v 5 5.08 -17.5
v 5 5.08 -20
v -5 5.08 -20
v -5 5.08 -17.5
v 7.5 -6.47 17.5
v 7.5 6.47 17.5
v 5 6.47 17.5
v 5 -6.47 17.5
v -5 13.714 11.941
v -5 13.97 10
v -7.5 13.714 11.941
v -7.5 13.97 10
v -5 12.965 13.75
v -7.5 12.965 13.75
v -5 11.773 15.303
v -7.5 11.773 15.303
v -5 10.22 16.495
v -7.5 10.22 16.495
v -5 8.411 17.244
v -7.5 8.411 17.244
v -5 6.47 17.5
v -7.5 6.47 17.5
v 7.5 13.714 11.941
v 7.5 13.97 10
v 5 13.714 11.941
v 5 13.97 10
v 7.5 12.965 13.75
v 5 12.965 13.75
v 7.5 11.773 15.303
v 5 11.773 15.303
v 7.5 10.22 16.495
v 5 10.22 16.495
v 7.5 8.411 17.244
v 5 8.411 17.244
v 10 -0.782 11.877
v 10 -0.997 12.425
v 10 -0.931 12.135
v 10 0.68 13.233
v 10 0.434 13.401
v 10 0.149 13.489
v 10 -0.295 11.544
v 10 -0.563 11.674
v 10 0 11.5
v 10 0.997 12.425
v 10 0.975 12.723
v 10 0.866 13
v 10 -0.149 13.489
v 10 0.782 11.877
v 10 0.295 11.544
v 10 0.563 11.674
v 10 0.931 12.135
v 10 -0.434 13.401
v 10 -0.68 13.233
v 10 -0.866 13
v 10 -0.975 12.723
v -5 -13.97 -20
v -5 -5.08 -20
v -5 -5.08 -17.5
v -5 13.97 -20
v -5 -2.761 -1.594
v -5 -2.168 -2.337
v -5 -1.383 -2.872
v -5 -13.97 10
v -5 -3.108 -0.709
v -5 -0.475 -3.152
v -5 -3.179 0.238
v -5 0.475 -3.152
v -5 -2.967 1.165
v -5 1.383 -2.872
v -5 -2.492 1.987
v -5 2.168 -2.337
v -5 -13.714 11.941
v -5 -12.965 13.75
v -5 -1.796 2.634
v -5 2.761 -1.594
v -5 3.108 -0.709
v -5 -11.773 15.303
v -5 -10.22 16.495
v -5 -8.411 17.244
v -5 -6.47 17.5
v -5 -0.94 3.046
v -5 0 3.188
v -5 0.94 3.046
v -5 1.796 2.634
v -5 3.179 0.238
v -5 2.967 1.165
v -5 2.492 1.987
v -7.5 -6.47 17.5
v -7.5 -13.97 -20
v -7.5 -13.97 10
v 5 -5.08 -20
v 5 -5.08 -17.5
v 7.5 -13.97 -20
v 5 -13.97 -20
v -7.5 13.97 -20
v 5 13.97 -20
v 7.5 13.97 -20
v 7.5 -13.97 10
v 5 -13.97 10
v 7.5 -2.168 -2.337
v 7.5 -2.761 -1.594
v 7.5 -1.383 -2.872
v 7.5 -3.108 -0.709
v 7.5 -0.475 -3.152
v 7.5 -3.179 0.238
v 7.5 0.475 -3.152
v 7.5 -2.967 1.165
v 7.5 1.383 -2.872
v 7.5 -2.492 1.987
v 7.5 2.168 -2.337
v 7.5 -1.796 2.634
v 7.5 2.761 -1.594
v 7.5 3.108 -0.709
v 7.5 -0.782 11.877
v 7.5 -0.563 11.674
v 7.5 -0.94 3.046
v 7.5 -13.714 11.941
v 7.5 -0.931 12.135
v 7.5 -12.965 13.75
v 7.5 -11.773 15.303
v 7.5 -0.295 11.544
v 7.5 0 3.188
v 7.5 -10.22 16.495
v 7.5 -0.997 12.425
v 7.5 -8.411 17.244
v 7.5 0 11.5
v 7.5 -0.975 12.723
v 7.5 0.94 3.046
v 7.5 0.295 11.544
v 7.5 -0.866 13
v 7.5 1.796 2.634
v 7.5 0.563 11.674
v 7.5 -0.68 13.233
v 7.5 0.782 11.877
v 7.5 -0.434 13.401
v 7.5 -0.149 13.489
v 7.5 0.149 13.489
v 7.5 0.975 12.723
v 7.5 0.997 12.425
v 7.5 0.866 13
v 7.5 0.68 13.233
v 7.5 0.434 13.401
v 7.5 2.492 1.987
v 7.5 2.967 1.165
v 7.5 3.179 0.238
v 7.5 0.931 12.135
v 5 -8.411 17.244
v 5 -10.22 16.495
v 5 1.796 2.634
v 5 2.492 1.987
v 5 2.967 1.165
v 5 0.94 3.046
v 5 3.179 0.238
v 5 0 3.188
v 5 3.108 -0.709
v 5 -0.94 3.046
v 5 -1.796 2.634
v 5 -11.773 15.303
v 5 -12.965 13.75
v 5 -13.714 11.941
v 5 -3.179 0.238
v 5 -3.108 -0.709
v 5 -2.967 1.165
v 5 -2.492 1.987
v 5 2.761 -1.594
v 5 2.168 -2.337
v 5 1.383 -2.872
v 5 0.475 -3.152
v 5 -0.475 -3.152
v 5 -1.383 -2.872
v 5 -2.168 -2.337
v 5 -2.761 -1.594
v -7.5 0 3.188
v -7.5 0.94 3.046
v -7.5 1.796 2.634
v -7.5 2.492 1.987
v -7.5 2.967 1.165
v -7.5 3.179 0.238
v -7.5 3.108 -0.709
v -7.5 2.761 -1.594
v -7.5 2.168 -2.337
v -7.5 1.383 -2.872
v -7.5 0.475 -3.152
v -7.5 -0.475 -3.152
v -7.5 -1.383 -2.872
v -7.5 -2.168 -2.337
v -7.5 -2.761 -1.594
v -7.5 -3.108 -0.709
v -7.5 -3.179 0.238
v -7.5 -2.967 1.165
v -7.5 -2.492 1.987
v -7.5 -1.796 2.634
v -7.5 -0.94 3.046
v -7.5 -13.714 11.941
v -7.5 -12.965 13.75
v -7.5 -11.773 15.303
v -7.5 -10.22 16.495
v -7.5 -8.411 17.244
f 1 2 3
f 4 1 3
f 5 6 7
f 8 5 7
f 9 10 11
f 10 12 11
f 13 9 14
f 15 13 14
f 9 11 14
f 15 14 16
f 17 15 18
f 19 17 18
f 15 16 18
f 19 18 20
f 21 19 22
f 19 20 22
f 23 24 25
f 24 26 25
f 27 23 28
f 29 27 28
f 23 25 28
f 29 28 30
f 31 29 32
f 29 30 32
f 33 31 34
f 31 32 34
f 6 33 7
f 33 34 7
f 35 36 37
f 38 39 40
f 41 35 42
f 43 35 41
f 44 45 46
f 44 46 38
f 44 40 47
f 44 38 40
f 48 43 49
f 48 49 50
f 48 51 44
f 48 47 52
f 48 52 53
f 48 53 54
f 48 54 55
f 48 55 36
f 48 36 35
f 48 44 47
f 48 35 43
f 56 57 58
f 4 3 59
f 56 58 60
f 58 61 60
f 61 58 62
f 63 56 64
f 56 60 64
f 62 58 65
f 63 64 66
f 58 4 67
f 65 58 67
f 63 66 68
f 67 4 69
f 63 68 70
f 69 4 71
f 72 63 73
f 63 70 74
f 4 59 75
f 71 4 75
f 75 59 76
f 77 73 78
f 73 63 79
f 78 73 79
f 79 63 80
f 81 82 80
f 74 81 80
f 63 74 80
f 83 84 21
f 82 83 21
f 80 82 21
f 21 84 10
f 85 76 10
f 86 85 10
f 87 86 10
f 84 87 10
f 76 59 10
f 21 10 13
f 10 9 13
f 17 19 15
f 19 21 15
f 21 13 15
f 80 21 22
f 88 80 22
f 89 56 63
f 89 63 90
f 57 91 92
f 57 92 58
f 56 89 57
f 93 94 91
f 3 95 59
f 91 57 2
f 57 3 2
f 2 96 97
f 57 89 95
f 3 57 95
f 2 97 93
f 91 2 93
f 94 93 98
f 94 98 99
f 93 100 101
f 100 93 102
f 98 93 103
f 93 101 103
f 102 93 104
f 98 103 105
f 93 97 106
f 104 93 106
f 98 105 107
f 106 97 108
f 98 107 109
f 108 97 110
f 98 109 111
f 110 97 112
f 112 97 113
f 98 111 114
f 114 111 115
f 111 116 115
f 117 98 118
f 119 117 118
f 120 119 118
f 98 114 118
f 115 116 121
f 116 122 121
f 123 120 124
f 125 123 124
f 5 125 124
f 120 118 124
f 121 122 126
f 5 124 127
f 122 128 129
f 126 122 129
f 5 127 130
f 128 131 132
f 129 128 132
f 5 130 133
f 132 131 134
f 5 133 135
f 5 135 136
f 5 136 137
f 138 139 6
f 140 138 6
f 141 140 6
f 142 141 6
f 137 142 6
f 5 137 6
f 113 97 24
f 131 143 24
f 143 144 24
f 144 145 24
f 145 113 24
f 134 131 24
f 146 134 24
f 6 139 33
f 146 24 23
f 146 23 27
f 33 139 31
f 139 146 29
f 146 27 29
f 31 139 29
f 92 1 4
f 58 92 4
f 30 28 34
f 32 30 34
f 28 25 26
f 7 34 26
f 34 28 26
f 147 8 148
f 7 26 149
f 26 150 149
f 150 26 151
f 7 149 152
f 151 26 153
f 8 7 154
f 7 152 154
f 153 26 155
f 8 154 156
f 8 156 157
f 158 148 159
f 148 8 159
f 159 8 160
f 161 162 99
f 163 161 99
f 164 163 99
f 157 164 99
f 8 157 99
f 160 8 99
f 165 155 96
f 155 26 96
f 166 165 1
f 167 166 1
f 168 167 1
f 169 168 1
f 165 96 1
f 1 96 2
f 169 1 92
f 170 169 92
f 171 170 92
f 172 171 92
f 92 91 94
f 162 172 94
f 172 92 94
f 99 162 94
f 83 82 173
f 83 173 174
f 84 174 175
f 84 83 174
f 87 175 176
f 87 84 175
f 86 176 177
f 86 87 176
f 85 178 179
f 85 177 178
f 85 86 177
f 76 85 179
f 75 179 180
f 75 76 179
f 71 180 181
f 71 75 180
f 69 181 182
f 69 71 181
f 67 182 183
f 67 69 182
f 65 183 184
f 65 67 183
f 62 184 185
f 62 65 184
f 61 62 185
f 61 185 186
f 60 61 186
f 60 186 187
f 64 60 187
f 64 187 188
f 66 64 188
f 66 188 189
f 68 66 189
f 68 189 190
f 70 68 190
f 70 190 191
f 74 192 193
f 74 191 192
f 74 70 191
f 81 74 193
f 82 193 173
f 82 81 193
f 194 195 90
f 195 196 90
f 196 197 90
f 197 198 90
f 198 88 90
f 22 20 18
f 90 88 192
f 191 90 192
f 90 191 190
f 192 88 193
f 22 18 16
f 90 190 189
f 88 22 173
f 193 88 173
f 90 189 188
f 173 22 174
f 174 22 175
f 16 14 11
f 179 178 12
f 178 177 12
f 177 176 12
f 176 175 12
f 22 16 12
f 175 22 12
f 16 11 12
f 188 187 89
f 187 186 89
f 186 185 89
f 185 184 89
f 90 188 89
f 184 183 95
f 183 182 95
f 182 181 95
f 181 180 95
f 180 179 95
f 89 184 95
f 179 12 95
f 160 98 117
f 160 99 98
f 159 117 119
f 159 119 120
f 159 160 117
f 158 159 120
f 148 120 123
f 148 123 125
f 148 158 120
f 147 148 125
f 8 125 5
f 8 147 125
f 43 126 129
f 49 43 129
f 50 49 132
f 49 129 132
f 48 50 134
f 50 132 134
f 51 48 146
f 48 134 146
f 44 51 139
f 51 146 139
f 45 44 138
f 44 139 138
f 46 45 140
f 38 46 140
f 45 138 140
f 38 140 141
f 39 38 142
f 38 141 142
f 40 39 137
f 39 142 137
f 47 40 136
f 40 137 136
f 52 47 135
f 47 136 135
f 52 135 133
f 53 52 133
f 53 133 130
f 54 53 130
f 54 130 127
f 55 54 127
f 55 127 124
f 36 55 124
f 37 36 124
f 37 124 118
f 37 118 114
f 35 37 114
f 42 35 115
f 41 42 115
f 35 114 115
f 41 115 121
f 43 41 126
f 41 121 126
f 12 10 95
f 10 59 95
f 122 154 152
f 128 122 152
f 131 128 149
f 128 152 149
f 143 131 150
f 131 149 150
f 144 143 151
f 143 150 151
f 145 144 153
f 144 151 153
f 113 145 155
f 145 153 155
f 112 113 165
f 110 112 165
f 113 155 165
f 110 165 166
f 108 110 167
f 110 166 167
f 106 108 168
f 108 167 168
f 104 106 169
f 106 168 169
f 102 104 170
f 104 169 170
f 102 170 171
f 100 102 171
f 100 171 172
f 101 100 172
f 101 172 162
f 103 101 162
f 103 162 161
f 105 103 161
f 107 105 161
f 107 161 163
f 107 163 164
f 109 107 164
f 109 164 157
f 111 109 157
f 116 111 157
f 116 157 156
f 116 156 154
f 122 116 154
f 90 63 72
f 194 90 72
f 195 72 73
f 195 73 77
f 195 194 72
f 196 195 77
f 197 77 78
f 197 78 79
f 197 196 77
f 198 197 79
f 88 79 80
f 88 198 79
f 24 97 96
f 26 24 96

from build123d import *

# Parameters (mm, degrees)
BOSS_EXTRUDE1_DEPTH     = 13.97
SKETCH5_R               = 1
BOSS_EXTRUDE4_DEPTH     = 2.5
SKETCH6_W               = 10
SKETCH6_H               = 8.89
CUT_EXTRUDE1_DEPTH      = 2.5
FILLET1_R               = 7.5
SKETCH4_R               = 3.1877
CUT_EXTRUDE2_DEPTH      = 13.5
CUT_EXTRUDE2_DEPTH_BACK = 6


with BuildPart() as part:
    # Sketch1 → Boss-Extrude1 (new body, symmetric)
    with BuildSketch(Plane(origin=(0, 0, 0), x_dir=(1, 0, 0), z_dir=(0, 1, 0))):
        Polygon((-7.5, -17.5), (-7.5, 20), (7.5, 20), (7.5, -17.5), (5, -17.5), (5, 17.5), (-5, 17.5), (-5, -17.5), align=None)
    extrude(amount=BOSS_EXTRUDE1_DEPTH, both=True)

    # Sketch5 → Boss-Extrude4 (add)
    with BuildSketch(Plane(origin=(7.5, 0, 0), x_dir=(0, 0, -1), z_dir=(1, 0, 0))):
        with Locations((-12.5, 0)):
            Circle(SKETCH5_R)
    extrude(amount=BOSS_EXTRUDE4_DEPTH)

    # Sketch6 → Cut-Extrude1 (cut)
    with BuildSketch(Plane(origin=(0, 0, -20), x_dir=(-1, 0, 0), z_dir=(0, 0, -1))):
        with Locations((0, -9.525)):
            Rectangle(SKETCH6_W, SKETCH6_H)
    cut_extrude1 = extrude(amount=-CUT_EXTRUDE1_DEPTH, mode=Mode.SUBTRACT)

    # Fillet1
    fillet1_edges = [part.edges().sort_by_distance(p)[0] for p in [
        (6.25, -13.97, 17.5),
        (-6.25, 13.97, 17.5),
        (6.25, 13.97, 17.5),
        (-6.25, -13.97, 17.5),
    ]]
    fillet(fillet1_edges, radius=FILLET1_R)

    # Sketch4 → Cut-Extrude2 (cut, two sides)
    with BuildSketch(Plane.ZY.offset(-5)) as cut_extrude2_sk:
        Circle(SKETCH4_R)
    extrude(amount=CUT_EXTRUDE2_DEPTH, mode=Mode.SUBTRACT)
    extrude(cut_extrude2_sk.sketch, amount=-CUT_EXTRUDE2_DEPTH_BACK, mode=Mode.SUBTRACT)

    # Mirror2: Cut-Extrude1 across plane
    add(cut_extrude1.mirror(Plane.ZX), mode=Mode.SUBTRACT)


solid = part.part
